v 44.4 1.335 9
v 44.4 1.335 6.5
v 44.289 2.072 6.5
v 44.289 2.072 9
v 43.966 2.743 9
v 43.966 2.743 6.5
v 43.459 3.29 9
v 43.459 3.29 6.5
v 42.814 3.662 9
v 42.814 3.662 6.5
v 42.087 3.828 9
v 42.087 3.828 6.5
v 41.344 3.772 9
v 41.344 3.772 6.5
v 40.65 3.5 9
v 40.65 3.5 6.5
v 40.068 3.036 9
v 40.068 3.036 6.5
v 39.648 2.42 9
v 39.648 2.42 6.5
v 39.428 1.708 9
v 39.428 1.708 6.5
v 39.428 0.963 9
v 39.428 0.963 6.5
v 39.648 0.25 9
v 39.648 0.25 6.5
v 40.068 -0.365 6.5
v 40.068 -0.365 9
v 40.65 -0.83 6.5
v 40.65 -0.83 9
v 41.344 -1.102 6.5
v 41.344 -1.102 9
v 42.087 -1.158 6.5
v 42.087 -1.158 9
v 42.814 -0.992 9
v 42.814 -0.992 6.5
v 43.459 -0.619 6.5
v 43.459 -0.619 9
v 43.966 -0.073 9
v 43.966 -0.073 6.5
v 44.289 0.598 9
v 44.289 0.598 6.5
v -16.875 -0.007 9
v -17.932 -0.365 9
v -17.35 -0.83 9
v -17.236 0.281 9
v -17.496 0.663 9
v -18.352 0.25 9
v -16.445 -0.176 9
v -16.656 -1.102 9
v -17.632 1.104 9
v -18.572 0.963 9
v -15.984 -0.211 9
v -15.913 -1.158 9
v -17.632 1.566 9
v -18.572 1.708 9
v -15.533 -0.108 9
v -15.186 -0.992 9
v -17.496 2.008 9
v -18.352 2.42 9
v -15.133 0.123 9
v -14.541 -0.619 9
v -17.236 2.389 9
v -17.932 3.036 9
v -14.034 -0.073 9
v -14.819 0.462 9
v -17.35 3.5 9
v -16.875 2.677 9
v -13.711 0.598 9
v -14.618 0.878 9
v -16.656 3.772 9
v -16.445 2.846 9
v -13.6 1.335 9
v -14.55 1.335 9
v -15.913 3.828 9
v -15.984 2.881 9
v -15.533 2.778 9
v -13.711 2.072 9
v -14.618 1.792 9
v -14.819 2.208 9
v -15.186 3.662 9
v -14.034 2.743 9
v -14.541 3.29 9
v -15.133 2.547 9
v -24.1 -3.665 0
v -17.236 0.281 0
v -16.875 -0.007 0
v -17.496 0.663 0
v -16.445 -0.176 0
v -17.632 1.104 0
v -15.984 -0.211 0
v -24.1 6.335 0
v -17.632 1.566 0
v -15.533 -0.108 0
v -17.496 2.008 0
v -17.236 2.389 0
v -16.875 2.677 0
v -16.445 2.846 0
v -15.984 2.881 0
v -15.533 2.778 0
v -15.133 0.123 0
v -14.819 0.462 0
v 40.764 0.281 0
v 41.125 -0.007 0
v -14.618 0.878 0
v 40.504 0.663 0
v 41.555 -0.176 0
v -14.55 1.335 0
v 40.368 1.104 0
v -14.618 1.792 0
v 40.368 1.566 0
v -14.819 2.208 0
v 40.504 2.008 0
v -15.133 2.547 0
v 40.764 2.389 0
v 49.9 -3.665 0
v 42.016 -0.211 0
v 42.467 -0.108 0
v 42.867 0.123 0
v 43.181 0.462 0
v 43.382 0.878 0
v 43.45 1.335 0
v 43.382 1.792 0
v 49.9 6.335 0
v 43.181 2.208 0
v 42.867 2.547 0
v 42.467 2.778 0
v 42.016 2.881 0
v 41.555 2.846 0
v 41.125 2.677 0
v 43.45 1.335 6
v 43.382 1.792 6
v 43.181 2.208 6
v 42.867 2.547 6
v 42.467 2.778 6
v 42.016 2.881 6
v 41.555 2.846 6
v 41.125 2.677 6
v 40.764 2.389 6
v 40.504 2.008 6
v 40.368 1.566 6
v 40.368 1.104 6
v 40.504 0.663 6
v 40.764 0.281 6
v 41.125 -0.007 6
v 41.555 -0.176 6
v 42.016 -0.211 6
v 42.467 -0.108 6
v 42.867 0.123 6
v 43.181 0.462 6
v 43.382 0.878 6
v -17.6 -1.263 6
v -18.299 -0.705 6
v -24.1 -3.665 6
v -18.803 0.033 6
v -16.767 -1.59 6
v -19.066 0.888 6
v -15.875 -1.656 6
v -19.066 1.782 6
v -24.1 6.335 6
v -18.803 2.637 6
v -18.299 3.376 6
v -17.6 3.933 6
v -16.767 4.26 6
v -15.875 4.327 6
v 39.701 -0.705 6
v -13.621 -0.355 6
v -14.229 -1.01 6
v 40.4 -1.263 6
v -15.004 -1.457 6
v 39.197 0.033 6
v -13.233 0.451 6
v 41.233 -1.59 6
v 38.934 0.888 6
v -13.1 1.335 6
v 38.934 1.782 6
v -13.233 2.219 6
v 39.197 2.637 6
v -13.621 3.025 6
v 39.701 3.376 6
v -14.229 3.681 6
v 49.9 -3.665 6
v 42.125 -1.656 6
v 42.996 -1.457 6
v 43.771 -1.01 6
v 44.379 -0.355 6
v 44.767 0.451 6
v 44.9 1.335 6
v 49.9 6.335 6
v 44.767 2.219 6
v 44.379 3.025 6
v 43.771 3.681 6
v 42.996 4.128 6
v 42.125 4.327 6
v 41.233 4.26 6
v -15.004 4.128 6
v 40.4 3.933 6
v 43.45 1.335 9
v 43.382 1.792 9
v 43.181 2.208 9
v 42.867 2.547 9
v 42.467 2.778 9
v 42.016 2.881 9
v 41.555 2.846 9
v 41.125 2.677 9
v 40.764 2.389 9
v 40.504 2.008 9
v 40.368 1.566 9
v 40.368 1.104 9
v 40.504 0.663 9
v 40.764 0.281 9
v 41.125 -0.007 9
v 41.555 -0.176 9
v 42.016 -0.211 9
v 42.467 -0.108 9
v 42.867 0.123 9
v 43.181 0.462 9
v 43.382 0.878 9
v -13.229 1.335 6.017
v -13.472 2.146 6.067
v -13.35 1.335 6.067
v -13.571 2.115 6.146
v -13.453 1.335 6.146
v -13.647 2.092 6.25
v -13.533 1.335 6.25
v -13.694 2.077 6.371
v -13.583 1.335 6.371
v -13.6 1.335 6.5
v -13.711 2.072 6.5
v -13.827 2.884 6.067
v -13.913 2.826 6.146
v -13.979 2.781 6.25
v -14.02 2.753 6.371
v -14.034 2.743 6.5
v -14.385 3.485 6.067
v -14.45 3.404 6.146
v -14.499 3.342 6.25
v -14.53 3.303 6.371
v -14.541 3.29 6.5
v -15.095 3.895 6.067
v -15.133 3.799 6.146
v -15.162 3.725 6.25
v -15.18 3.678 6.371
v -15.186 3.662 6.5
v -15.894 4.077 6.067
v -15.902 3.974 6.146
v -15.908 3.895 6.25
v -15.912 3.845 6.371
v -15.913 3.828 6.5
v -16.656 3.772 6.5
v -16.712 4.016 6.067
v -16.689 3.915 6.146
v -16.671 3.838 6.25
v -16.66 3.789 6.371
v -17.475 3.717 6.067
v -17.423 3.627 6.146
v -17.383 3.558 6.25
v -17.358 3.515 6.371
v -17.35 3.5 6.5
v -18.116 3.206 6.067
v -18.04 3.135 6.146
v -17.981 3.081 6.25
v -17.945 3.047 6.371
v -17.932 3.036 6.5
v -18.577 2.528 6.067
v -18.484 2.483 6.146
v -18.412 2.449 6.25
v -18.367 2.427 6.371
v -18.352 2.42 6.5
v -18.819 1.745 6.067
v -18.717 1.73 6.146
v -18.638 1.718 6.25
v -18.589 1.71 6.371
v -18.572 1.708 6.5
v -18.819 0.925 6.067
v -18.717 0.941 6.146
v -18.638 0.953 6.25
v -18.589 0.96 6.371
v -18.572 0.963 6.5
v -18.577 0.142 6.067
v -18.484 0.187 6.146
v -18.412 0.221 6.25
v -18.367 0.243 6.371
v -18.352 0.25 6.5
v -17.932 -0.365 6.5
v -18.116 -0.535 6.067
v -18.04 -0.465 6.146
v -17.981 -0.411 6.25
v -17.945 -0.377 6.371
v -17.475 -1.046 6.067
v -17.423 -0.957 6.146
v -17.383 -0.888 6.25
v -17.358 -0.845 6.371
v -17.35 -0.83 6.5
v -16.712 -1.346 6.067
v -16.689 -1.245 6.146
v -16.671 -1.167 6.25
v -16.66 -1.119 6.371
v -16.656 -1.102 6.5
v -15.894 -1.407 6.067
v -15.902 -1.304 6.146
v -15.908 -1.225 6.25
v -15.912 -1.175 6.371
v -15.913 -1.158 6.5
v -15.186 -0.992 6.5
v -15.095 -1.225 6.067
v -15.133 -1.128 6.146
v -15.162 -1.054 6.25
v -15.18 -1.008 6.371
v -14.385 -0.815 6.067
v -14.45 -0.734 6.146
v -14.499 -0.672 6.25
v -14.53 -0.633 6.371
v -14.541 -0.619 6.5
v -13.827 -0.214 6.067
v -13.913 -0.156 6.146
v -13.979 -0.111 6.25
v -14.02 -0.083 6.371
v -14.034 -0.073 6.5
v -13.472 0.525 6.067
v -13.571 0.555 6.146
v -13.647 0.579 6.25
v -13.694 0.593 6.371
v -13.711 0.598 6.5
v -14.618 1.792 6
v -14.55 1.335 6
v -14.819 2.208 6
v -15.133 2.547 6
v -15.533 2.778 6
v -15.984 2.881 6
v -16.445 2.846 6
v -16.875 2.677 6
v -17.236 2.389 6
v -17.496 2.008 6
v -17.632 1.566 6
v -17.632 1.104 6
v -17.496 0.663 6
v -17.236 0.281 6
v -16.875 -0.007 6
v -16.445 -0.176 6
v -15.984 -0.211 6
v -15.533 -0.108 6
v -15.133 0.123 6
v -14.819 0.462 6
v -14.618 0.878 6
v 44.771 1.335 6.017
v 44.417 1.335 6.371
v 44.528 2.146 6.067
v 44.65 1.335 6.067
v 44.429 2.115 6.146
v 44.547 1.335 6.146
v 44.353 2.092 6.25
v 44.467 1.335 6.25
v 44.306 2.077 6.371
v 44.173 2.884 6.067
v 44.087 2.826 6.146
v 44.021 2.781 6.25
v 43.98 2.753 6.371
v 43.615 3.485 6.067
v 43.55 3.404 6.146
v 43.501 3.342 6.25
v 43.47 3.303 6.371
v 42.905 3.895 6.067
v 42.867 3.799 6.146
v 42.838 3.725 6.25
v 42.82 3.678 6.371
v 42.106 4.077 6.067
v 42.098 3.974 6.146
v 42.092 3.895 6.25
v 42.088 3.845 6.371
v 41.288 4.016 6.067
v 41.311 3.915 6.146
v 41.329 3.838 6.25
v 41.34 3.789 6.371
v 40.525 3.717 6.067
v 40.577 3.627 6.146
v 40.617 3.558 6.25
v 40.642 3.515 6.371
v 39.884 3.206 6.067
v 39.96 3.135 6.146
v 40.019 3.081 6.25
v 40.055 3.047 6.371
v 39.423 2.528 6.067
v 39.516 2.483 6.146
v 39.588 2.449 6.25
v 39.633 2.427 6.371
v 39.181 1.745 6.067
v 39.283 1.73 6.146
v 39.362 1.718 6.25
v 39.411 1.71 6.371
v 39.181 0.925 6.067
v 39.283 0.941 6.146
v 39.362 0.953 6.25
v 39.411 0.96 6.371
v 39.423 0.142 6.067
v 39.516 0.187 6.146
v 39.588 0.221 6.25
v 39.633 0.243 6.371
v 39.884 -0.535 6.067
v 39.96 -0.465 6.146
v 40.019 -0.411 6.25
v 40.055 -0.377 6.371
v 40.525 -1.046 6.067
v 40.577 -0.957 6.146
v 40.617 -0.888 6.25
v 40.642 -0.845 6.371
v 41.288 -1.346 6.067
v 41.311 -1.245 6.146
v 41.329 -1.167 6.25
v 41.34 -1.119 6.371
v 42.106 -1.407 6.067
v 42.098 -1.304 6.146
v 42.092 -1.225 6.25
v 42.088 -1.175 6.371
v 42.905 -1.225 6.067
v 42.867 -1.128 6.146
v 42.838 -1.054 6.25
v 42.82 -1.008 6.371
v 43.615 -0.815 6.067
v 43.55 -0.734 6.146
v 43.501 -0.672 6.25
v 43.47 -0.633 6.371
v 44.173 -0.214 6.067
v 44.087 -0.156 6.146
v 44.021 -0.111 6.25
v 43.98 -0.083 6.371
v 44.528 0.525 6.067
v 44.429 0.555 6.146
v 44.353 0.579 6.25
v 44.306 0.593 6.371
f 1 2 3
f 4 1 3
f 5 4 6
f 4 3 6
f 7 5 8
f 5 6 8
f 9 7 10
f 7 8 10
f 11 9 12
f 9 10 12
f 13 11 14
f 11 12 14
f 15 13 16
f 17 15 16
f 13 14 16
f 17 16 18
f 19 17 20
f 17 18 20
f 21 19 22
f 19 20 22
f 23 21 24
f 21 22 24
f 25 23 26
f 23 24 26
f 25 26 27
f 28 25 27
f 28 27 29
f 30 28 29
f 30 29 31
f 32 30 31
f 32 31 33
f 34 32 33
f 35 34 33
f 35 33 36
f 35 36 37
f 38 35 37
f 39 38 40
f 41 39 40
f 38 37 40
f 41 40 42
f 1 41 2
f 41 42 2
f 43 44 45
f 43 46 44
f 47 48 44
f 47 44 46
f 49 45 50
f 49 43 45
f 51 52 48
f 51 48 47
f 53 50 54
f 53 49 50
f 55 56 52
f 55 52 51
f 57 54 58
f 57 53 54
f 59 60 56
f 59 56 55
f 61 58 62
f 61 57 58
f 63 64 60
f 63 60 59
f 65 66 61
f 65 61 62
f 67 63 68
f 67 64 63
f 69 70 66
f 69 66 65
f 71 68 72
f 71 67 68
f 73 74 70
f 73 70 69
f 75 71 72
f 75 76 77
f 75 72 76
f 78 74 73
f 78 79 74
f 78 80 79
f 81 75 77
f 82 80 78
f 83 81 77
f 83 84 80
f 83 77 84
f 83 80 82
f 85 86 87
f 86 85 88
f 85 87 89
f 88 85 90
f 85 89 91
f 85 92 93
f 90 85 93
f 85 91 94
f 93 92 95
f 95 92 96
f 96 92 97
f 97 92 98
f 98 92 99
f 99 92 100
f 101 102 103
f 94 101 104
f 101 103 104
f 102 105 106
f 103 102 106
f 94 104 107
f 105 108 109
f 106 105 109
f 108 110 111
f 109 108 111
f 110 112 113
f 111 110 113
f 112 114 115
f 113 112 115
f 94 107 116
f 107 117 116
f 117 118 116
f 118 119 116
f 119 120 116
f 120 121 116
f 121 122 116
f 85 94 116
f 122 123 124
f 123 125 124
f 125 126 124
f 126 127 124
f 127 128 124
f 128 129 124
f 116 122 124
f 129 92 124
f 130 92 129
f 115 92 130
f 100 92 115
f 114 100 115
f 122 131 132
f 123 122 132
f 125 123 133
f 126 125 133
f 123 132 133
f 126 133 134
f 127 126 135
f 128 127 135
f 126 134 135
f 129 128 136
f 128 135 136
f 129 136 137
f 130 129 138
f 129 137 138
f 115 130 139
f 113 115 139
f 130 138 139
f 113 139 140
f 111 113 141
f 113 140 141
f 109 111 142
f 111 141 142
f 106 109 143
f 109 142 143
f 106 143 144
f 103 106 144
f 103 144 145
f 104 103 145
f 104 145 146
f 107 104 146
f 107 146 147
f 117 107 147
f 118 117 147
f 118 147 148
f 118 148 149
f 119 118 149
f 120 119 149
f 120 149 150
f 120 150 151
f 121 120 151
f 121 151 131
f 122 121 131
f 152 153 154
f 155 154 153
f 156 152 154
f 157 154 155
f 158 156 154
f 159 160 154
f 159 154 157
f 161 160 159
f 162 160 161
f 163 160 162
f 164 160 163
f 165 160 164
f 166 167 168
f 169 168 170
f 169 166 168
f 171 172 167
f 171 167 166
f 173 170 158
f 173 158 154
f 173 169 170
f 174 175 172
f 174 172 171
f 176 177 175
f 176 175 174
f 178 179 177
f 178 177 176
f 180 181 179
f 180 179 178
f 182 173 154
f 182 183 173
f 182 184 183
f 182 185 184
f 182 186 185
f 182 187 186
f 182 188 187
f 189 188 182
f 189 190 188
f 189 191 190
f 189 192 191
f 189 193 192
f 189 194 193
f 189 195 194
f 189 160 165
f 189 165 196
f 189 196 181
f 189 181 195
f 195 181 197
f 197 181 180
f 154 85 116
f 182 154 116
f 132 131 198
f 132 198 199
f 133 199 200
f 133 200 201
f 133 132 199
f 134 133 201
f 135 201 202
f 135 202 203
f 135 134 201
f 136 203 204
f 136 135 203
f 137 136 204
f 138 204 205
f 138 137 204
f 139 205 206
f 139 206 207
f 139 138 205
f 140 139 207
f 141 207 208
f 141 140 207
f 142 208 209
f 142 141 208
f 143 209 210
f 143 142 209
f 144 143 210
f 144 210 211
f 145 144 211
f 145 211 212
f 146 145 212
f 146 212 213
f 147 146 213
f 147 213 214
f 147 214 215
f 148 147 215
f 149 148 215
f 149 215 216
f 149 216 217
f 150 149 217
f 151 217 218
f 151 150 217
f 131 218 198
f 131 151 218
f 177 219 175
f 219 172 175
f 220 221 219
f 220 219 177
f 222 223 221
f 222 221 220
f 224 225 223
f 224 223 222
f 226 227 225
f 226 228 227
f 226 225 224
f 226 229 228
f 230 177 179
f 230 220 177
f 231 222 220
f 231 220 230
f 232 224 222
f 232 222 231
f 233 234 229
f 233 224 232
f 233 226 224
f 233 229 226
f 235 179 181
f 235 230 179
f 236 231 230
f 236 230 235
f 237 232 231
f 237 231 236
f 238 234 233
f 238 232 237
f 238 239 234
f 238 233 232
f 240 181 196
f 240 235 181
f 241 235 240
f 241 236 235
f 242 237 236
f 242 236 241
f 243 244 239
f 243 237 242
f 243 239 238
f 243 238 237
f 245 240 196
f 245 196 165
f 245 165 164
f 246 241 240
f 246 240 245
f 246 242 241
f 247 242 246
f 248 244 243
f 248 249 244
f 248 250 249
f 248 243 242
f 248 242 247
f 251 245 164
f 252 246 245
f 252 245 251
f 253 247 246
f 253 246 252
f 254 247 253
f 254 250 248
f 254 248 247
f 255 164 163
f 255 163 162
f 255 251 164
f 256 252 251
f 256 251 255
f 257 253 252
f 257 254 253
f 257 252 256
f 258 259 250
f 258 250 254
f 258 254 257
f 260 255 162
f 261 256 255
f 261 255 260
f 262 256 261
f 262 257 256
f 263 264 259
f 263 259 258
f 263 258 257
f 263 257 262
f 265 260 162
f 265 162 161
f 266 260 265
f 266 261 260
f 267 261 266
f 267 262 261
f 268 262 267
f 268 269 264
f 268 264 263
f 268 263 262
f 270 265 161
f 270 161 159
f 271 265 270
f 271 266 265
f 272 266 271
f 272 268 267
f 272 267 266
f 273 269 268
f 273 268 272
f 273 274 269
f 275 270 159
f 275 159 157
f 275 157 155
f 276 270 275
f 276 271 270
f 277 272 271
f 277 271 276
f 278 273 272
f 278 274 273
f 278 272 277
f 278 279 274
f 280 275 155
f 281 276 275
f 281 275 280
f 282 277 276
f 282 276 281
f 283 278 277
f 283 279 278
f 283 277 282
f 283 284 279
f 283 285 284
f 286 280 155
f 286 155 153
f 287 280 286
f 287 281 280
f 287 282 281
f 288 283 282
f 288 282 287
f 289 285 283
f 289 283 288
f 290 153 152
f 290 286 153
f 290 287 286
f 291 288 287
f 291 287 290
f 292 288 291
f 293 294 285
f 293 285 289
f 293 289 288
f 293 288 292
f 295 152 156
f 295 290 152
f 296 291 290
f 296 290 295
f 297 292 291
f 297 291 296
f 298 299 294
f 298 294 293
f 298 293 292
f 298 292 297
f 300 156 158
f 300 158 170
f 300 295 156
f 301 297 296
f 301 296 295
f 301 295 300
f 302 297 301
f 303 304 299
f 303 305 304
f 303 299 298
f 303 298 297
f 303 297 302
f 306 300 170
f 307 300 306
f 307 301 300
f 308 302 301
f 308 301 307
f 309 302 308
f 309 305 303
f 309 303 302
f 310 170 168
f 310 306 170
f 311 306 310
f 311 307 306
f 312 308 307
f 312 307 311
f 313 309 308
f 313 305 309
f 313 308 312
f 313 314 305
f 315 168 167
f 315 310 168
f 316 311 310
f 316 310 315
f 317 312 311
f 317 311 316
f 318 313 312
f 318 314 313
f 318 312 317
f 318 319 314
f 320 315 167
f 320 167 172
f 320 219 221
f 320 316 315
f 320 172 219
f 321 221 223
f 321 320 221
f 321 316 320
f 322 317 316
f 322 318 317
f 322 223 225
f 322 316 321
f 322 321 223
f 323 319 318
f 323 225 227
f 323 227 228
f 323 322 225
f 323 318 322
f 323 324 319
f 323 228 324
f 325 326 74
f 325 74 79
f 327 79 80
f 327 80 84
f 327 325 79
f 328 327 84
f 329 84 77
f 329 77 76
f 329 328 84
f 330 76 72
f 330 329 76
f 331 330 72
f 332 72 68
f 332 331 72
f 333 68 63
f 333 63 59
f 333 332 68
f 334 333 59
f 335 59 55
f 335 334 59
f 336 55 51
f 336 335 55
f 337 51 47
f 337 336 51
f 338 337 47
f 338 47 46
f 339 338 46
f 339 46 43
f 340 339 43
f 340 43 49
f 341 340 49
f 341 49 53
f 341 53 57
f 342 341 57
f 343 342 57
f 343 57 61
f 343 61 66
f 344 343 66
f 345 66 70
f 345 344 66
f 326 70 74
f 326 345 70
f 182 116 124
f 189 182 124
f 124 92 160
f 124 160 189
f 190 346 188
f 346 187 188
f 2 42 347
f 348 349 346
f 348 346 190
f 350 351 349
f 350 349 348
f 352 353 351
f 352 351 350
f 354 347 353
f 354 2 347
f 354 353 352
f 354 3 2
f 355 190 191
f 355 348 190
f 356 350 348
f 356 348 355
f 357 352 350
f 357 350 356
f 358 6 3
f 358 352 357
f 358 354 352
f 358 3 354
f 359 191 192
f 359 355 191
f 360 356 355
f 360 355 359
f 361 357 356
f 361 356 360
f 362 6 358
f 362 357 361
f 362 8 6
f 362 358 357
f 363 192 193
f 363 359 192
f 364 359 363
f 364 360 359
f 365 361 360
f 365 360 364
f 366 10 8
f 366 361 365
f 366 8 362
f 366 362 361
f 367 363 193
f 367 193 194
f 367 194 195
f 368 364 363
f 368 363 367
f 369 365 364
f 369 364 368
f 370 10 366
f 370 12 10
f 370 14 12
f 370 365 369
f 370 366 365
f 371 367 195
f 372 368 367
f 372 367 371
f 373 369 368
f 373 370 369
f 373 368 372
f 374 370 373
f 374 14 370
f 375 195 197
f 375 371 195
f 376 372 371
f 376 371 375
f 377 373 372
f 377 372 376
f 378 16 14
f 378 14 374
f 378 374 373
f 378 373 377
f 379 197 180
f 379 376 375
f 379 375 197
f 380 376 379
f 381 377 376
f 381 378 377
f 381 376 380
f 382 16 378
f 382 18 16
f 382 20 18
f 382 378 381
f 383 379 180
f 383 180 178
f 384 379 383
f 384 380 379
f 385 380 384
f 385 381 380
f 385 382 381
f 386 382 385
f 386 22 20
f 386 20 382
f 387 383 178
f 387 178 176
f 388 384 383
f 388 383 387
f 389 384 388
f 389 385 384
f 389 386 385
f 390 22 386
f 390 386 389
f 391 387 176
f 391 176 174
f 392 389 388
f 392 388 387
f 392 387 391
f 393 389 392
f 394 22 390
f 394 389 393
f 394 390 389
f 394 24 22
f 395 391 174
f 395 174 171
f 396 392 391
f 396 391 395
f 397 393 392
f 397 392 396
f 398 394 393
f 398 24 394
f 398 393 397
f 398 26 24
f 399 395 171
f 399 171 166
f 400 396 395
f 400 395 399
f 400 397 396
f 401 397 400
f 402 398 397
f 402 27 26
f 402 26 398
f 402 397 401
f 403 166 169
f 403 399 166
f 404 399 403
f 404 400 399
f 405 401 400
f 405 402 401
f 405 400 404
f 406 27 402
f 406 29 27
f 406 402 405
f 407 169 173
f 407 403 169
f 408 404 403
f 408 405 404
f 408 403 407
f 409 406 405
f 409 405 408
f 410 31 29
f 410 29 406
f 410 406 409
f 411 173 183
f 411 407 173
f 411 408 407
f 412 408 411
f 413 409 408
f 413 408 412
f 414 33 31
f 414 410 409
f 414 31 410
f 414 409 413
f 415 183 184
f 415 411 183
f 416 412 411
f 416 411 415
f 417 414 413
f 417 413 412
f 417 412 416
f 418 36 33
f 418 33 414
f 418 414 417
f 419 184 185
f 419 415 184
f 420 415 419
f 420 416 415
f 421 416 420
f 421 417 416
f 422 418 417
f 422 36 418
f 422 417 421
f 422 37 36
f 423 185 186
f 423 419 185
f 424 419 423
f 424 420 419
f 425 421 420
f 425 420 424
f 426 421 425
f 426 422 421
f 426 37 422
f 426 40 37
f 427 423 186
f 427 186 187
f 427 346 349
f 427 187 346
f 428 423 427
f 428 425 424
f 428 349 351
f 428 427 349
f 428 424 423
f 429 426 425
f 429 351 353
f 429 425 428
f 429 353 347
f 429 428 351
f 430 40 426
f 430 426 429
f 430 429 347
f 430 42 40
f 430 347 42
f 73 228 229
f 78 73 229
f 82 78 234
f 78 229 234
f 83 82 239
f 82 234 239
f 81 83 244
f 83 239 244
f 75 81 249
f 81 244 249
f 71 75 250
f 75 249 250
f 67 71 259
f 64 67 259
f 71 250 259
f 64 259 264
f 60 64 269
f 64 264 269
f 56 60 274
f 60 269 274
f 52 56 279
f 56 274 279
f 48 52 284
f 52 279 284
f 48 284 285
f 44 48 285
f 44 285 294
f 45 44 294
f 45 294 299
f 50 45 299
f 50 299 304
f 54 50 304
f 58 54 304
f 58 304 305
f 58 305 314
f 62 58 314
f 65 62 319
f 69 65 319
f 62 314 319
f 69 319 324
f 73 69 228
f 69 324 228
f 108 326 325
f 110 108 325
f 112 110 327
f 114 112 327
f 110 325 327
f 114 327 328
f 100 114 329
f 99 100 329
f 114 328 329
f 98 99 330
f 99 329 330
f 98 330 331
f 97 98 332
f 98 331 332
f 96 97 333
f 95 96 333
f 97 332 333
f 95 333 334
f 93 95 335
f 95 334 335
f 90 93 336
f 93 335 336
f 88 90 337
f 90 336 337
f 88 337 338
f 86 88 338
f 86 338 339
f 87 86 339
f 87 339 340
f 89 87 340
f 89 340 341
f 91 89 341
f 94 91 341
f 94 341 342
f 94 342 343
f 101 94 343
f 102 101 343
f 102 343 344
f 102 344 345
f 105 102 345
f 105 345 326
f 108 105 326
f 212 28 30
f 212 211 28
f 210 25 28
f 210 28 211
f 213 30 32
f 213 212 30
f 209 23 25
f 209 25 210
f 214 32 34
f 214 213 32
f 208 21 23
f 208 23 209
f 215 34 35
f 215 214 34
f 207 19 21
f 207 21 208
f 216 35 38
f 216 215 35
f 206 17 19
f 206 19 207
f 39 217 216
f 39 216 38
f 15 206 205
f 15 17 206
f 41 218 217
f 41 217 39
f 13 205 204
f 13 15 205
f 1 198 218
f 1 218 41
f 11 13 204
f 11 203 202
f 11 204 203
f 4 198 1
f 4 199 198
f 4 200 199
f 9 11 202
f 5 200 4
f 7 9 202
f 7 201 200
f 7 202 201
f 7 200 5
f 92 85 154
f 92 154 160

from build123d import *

# Parameters (mm, degrees)
SKETCH_1_W          = 74
SKETCH_1_H          = 10
EXTRUDE_1_DEPTH     = 6
SKETCH_2_R          = 1.55
CUT_EXTRUDE_1_DEPTH = 10
SKETCH_3_R          = 2.5
SKETCH_3_R_2        = 1.55
EXTRUDE_2_DEPTH     = 3
FILLET_5_R          = 0.5
FILLET_7_R          = 0.5


with BuildPart() as part:
    # 草图1 → 凸台-拉伸1 (new body)
    with BuildSketch(Plane.XY):
        with Locations((12.900383142, 1.335145162)):
            Rectangle(SKETCH_1_W, SKETCH_1_H)
    extrude(amount=EXTRUDE_1_DEPTH)

    # 草图2 → 切除-拉伸1 (cut)
    with BuildSketch(Plane.XY.offset(6)):
        with Locations((-16.099616858, 1.335145162)):
            Circle(SKETCH_2_R)
        with Locations((41.900383142, 1.335145162)):
            Circle(SKETCH_2_R)
    extrude(amount=-CUT_EXTRUDE_1_DEPTH, mode=Mode.SUBTRACT)

    # 草图3 → 凸台-拉伸2 (add)
    with BuildSketch(Plane.XY.offset(6)):
        with Locations((-16.099616858, 1.335145162)):
            Circle(SKETCH_3_R)
        with Locations((-16.099616858, 1.335145162)):
            Circle(SKETCH_3_R_2, mode=Mode.SUBTRACT)
        with Locations((41.900383142, 1.335145162)):
            Circle(SKETCH_3_R)
        with Locations((41.900383142, 1.335145162)):
            Circle(SKETCH_3_R_2, mode=Mode.SUBTRACT)
    extrude(amount=EXTRUDE_2_DEPTH)

    # 圆角5
    fillet_5_edges = [part.edges().sort_by_distance(p)[0] for p in [
        (39.400383142, 1.335145162, 6),
    ]]
    fillet(fillet_5_edges, radius=FILLET_5_R)

    # 圆角7
    fillet_7_edges = [part.edges().sort_by_distance(p)[0] for p in [
        (-18.599616858, 1.335145162, 6),
    ]]
    fillet(fillet_7_edges, radius=FILLET_7_R)


solid = part.part
